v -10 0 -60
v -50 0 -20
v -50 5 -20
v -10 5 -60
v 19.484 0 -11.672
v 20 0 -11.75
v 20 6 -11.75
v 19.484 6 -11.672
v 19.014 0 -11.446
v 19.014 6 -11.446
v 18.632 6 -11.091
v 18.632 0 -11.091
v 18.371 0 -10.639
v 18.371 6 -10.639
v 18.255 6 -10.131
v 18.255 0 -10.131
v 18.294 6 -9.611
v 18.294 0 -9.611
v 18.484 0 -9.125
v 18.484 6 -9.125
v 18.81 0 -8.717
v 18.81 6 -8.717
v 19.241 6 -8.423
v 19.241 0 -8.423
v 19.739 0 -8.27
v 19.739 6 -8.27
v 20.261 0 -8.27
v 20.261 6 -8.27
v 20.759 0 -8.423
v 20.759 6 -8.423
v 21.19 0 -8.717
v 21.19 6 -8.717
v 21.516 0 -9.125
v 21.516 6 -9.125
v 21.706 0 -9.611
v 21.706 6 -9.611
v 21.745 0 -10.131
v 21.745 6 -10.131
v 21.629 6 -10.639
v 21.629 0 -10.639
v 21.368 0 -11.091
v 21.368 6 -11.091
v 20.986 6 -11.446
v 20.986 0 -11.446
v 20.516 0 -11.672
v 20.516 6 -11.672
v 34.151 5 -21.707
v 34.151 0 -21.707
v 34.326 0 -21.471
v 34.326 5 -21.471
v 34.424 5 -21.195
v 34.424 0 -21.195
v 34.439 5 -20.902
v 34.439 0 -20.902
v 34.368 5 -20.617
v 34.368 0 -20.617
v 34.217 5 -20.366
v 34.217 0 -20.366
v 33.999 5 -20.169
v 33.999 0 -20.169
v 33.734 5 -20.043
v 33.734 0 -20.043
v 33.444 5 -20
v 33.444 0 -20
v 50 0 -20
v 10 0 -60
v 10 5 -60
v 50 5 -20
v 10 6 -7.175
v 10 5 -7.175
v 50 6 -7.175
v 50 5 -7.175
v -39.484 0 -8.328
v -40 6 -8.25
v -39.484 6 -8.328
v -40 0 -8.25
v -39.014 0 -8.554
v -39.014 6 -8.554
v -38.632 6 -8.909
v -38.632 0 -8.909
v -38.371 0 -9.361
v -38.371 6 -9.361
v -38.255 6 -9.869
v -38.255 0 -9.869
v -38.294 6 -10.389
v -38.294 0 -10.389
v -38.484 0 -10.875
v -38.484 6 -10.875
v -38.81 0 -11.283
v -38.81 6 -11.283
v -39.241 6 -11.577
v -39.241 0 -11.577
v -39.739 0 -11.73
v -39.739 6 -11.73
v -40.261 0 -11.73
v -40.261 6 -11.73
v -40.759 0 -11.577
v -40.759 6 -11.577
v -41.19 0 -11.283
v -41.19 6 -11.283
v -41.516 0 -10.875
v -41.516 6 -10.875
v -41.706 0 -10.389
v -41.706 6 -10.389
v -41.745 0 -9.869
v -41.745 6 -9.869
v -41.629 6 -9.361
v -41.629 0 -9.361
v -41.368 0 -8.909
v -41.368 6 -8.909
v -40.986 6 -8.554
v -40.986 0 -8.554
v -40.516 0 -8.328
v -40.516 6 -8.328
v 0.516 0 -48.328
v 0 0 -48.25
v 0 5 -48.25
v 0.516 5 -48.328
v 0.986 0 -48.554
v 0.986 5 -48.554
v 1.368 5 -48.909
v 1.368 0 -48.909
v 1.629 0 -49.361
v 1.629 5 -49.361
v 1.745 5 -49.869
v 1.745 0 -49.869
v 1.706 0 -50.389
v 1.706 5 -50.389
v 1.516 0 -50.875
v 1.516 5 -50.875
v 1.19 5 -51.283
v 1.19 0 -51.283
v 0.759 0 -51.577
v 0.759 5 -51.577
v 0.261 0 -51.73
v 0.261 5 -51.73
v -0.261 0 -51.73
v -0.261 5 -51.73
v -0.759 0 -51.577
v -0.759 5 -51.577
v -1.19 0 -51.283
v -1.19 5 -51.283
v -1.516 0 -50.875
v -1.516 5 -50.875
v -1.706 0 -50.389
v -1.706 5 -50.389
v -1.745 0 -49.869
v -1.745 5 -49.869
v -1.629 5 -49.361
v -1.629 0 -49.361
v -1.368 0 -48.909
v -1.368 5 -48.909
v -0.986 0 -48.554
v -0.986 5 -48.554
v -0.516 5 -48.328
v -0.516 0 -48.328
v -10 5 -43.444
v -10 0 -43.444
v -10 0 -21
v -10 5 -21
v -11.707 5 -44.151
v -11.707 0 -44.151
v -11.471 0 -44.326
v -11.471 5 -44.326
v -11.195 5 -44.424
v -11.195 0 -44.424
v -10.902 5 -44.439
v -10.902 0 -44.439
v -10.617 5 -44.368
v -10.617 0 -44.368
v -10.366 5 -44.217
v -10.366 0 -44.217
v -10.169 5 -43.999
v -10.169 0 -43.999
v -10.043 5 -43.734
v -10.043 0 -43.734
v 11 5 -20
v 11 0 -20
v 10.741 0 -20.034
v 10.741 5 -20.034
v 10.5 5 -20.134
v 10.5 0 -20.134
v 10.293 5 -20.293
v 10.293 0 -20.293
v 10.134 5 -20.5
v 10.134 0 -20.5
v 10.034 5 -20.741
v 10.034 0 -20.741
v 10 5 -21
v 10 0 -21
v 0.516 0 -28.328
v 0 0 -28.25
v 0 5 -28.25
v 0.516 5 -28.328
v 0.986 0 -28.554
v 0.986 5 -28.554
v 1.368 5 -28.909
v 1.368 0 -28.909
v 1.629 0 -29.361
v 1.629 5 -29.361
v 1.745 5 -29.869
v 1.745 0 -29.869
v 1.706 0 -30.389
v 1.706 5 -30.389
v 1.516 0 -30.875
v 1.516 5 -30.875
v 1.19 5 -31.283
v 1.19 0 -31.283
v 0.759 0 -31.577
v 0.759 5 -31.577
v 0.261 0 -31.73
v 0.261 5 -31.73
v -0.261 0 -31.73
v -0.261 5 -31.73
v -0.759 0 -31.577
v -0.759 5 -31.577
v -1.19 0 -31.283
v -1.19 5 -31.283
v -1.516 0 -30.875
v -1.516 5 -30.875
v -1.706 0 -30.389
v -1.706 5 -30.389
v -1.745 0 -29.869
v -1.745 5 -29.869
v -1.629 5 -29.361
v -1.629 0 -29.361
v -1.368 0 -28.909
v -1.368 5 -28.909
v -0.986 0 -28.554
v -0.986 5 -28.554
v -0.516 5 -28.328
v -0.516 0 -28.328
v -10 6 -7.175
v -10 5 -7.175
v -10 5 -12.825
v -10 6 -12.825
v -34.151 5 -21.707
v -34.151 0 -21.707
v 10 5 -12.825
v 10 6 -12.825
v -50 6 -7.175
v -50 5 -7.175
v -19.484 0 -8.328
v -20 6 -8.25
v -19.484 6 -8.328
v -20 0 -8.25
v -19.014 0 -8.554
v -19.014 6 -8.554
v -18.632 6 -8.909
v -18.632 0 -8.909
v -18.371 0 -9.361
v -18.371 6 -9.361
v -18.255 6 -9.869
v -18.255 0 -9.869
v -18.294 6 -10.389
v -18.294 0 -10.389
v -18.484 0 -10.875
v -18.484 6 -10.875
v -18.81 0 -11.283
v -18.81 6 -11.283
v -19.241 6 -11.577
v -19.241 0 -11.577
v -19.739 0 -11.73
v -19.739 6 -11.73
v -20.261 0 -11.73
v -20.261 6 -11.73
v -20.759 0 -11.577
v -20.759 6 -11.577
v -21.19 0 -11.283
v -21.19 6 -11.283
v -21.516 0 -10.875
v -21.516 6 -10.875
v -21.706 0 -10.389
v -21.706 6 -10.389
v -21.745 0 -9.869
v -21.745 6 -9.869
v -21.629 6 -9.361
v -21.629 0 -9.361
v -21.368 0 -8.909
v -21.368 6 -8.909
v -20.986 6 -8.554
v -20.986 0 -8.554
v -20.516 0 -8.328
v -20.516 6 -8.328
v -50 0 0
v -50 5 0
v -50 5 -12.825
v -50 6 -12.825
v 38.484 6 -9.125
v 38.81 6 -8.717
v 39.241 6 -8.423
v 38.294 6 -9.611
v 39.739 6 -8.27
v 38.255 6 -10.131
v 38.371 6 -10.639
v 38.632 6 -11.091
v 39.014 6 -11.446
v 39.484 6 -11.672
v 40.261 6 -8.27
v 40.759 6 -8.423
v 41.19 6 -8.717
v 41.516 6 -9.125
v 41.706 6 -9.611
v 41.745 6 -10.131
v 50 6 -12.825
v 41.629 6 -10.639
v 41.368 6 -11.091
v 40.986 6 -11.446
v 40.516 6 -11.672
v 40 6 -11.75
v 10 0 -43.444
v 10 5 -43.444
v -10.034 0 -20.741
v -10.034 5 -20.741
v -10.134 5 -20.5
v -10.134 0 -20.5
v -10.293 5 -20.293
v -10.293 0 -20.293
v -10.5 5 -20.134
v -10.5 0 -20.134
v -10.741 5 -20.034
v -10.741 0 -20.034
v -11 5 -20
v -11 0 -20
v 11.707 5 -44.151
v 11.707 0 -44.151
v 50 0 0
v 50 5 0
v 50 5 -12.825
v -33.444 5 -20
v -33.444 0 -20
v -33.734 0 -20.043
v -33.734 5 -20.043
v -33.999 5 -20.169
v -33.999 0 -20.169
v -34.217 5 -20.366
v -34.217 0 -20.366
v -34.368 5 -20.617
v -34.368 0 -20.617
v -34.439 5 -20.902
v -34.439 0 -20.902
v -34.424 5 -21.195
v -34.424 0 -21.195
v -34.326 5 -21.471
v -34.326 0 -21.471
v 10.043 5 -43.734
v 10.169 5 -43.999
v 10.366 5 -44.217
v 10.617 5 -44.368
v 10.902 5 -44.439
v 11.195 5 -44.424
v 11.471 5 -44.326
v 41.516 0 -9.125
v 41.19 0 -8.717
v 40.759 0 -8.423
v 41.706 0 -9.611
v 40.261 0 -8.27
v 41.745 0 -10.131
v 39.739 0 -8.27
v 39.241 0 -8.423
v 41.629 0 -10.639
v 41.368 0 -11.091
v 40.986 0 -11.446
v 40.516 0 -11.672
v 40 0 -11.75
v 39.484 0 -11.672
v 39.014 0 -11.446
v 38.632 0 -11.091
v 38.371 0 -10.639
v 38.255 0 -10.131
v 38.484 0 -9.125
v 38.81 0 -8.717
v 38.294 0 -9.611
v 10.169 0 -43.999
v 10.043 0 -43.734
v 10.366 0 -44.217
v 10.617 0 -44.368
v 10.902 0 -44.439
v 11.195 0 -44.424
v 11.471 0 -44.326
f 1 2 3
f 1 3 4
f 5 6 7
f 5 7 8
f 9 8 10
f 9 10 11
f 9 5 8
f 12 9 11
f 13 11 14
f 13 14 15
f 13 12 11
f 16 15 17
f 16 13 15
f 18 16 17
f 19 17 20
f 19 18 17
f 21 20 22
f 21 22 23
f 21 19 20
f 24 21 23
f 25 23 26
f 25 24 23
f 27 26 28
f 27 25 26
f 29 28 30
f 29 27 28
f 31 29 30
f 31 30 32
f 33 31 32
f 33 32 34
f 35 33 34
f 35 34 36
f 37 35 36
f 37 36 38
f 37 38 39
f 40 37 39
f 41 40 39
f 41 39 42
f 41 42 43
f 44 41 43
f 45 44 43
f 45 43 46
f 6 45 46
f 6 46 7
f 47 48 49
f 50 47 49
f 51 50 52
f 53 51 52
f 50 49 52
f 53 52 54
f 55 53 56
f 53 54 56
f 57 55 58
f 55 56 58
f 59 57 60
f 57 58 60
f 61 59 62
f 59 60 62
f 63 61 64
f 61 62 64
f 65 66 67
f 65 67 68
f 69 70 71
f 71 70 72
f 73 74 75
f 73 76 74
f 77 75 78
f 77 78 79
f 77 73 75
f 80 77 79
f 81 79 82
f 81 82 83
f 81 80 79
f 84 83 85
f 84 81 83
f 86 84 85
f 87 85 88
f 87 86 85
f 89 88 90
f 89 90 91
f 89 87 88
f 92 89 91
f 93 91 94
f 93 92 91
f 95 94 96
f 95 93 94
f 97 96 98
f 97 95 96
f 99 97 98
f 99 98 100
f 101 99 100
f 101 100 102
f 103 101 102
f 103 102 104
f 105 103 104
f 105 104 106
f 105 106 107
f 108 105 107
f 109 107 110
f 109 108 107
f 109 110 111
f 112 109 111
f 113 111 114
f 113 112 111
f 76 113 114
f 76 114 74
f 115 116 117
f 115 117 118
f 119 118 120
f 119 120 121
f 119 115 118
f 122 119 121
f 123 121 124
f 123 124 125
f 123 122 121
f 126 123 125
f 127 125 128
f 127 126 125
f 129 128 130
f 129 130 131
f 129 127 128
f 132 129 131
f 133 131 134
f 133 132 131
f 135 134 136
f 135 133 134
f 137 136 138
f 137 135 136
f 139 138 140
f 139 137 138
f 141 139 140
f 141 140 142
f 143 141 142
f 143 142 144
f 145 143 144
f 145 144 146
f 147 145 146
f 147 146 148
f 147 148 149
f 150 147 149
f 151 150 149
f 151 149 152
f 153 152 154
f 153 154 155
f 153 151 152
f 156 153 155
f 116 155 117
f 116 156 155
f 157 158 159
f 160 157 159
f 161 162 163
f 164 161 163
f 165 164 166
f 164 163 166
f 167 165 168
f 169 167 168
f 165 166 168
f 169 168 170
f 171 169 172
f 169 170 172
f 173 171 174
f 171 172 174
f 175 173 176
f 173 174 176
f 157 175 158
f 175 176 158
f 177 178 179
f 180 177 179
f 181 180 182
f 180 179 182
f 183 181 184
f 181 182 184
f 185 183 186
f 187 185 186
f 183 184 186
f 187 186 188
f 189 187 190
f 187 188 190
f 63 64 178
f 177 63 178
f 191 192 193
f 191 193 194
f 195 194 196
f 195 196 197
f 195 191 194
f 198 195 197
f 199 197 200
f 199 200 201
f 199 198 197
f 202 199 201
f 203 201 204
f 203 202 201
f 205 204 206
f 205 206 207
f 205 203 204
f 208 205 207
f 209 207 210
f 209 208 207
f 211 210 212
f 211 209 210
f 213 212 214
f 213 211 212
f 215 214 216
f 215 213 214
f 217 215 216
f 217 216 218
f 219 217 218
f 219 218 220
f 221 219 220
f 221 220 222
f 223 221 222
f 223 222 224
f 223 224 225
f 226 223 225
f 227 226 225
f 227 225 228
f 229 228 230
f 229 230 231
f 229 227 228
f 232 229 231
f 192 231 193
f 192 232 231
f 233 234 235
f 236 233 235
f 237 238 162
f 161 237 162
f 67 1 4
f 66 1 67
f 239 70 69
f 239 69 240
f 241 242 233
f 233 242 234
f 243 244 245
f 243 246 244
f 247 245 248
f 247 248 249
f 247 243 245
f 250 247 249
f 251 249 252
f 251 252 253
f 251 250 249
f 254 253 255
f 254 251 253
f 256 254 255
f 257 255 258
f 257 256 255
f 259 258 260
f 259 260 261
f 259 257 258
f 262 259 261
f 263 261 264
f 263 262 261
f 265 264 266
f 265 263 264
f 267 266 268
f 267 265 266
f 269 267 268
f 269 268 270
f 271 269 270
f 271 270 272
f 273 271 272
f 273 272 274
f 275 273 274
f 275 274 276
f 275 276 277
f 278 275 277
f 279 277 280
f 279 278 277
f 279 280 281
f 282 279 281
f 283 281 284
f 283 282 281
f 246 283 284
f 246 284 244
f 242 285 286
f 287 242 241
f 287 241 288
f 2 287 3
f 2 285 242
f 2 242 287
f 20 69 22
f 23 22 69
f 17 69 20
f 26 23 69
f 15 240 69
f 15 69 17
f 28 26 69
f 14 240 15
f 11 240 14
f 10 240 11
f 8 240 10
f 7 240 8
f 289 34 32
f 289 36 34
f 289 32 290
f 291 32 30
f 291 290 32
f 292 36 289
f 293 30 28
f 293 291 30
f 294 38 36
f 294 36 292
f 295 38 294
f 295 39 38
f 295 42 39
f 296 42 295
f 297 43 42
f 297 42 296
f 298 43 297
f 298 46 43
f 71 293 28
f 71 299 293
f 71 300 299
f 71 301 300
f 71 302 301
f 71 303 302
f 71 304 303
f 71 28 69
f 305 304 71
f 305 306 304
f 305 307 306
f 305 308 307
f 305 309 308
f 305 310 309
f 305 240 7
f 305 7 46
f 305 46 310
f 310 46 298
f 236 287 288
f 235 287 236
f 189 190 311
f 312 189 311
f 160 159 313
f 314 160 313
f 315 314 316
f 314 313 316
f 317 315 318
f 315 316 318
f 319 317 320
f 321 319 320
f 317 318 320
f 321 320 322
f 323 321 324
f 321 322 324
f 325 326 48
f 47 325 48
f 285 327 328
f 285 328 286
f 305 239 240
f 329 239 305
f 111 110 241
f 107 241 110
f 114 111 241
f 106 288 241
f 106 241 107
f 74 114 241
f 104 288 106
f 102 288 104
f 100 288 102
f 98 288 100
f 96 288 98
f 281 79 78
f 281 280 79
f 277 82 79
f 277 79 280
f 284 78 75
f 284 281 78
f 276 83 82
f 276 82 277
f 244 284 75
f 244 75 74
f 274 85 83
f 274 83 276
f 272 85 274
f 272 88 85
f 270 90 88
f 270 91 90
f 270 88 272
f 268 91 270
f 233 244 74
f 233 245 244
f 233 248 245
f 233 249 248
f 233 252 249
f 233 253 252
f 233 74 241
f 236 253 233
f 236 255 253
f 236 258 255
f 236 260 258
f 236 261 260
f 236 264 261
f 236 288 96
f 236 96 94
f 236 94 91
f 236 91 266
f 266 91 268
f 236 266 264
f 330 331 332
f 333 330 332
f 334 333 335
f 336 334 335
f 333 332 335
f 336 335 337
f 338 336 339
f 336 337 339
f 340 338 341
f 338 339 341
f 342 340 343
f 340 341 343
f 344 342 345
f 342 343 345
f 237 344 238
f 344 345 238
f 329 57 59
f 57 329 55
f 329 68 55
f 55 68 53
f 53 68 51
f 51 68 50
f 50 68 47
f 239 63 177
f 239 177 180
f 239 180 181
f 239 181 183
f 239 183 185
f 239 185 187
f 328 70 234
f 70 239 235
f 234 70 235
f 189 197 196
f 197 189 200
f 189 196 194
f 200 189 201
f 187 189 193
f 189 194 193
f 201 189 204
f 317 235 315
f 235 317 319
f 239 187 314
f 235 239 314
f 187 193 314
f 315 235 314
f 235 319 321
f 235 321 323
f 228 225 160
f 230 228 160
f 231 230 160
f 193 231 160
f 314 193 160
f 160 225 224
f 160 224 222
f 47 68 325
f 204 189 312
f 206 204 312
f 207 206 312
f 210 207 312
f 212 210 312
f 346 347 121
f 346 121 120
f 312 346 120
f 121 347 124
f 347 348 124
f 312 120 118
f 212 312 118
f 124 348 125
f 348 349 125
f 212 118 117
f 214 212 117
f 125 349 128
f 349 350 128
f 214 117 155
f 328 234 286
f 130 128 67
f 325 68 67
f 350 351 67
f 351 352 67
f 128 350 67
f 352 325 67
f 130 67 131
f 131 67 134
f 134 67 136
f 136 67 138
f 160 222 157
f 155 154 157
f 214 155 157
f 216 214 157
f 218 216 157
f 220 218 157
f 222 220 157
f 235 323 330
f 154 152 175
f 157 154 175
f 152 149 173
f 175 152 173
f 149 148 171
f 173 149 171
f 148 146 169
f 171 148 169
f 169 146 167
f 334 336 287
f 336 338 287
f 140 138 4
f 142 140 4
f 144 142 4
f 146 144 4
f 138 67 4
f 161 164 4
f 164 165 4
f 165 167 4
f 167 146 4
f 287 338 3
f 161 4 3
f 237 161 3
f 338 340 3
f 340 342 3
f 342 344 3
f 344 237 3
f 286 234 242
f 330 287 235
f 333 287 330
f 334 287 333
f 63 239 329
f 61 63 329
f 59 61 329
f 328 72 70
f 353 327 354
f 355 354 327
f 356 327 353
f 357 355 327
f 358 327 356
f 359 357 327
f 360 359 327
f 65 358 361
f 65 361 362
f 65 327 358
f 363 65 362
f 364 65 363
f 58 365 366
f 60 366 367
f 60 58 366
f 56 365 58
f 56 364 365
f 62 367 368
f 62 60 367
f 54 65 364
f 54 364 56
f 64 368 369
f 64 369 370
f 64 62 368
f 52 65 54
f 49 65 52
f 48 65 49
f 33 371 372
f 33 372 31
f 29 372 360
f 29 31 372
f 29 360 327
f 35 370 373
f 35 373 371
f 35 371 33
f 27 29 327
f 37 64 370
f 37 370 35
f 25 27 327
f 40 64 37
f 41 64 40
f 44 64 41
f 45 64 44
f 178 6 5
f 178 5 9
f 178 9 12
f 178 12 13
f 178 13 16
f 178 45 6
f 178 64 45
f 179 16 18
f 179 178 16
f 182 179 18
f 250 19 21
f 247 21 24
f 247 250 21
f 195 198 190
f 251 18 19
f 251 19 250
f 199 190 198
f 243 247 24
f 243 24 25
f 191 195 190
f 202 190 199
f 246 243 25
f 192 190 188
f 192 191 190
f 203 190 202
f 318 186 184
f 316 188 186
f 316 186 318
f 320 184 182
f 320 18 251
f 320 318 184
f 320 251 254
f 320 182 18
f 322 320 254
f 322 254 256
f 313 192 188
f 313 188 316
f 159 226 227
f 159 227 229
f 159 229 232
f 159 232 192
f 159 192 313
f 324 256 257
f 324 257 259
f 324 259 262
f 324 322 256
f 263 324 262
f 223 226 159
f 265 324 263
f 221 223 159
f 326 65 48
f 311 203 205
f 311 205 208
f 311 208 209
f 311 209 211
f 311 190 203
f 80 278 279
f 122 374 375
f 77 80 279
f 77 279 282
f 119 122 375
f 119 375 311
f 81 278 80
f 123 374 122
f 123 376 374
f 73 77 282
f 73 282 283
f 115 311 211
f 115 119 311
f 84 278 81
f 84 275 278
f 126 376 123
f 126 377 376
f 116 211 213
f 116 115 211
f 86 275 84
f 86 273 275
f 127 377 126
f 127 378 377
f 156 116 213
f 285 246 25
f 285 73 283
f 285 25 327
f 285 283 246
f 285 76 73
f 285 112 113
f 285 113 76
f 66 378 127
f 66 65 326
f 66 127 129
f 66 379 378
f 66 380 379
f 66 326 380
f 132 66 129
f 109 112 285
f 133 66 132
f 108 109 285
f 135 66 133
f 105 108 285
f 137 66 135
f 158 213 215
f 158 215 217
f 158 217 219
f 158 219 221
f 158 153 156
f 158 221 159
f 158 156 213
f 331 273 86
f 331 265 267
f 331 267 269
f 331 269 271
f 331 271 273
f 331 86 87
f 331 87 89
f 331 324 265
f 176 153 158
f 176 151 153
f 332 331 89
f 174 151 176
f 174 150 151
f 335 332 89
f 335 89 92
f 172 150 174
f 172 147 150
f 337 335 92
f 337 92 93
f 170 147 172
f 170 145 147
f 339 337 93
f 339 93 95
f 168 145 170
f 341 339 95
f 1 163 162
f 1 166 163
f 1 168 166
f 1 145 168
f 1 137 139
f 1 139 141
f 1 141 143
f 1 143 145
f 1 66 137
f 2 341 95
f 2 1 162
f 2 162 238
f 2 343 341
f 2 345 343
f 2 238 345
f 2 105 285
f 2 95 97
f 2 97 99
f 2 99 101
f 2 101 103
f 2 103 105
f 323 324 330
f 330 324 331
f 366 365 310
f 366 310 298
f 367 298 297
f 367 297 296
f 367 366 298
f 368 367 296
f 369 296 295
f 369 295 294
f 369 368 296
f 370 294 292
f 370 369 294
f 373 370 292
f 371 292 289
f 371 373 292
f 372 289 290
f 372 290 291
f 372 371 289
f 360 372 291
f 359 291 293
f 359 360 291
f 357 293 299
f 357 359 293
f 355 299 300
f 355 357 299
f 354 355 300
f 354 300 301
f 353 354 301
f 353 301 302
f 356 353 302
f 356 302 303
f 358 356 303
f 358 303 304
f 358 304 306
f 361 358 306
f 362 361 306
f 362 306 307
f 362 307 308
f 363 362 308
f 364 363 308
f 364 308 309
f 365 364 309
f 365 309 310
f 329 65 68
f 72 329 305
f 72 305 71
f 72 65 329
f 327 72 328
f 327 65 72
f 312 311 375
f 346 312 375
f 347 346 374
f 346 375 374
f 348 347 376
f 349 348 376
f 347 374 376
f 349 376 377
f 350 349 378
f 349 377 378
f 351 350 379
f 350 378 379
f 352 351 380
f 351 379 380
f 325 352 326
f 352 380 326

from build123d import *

# Parameters (mm, degrees)
ESBO_O1_R                = 1.75
RESSALTO_EXTRUS_O1_DEPTH = 5
ESBO_O3_W                = 40
ESBO_O3_H                = 5.65
ESBO_O3_R                = 1.75
RESSALTO_EXTRUS_O2_DEPTH = 1


with BuildPart() as part:
    # Esboço1 → Ressalto-extrusão1 (new body)
    with BuildSketch(Plane(origin=(0, 0, 0), x_dir=(1, 0, 0), z_dir=(0, 1, 0))):
        Polygon((-50, 0), (-50, 20.000002677), (-9.999996661, 60.000002546), (9.999996661, 60.000002546), (50, 20.000002677), (50, 0), align=None)
        with Locations(Location((-40, 10.000001339, 0), (0, 0, 270))):
            Circle(ESBO_O1_R, mode=Mode.SUBTRACT)
        with Locations(Location((-20, 10.000001339, 0), (0, 0, 270))):
            Circle(ESBO_O1_R, mode=Mode.SUBTRACT)
        with Locations(Location((0, 50.000002546, 0), (0, 0, 270))):
            Circle(ESBO_O1_R, mode=Mode.SUBTRACT)
        with Locations(Location((0, 30.000002546, 0), (0, 0, 270))):
            Circle(ESBO_O1_R, mode=Mode.SUBTRACT)
        with Locations(Location((20, 10.000001339, 0), (0, 0, 90))):
            Circle(ESBO_O1_R, mode=Mode.SUBTRACT)
        with Locations(Location((40, 10.000001339, 0), (0, 0, 90))):
            Circle(ESBO_O1_R, mode=Mode.SUBTRACT)
        with BuildLine():
            Line((-10, 43.443650782), (-10, 21.000001339))
            ThreePointArc((-10, 21.000001339), (-10.292893219, 20.292894558), (-11, 20.000001339))
            Line((-11, 20.000001339), (-33.443651391, 20.000001339))
            ThreePointArc((-33.443651391, 20.000001339), (-34.367530932, 20.617317926), (-34.150758141, 21.707108151))
            Line((-34.150758141, 21.707108151), (-11.707106751, 44.150757594))
            ThreePointArc((-11.707106751, 44.150757594), (-10.617316548, 44.367530307), (-10, 43.443650782))
        make_face(mode=Mode.SUBTRACT)
        with BuildLine():
            Line((11.707106751, 44.150757594), (34.150758141, 21.707108151))
            ThreePointArc((34.150758141, 21.707108151), (34.367530932, 20.617317926), (33.443651391, 20.000001339))
            Line((33.443651391, 20.000001339), (11, 20.000001339))
            ThreePointArc((11, 20.000001339), (10.292893219, 20.292894558), (10, 21.000001339))
            Line((10, 21.000001339), (10, 43.443650782))
            ThreePointArc((10, 43.443650782), (10.617316548, 44.367530307), (11.707106751, 44.150757594))
        make_face(mode=Mode.SUBTRACT)
    extrude(amount=RESSALTO_EXTRUS_O1_DEPTH)

    # Esboço3 → Ressalto-extrusão2 (add)
    # profile 1 of 2: a face of its own
    with BuildSketch(Plane(origin=(0, 5, 0), x_dir=(1, 0, 0), z_dir=(0, 1, 0))):
        with Locations((-30, 10.000001339)):
            Rectangle(ESBO_O3_W, ESBO_O3_H)
        with Locations(Location((-40, 10.000001339, 0), (0, 0, 270))):
            Circle(ESBO_O3_R, mode=Mode.SUBTRACT)
        with Locations(Location((-20, 10.000001339, 0), (0, 0, 270))):
            Circle(ESBO_O3_R, mode=Mode.SUBTRACT)
    # profile 2 of 2: a face of its own
    with BuildSketch(Plane(origin=(0, 5, 0), x_dir=(1, 0, 0), z_dir=(0, 1, 0))):
        with Locations((30, 10.000001339)):
            Rectangle(ESBO_O3_W, ESBO_O3_H)
        with Locations(Location((20, 10.000001339, 0), (0, 0, 90))):
            Circle(ESBO_O3_R, mode=Mode.SUBTRACT)
        with Locations(Location((40, 10.000001339, 0), (0, 0, 90))):
            Circle(ESBO_O3_R, mode=Mode.SUBTRACT)
    extrude(amount=RESSALTO_EXTRUS_O2_DEPTH)


solid = part.part
